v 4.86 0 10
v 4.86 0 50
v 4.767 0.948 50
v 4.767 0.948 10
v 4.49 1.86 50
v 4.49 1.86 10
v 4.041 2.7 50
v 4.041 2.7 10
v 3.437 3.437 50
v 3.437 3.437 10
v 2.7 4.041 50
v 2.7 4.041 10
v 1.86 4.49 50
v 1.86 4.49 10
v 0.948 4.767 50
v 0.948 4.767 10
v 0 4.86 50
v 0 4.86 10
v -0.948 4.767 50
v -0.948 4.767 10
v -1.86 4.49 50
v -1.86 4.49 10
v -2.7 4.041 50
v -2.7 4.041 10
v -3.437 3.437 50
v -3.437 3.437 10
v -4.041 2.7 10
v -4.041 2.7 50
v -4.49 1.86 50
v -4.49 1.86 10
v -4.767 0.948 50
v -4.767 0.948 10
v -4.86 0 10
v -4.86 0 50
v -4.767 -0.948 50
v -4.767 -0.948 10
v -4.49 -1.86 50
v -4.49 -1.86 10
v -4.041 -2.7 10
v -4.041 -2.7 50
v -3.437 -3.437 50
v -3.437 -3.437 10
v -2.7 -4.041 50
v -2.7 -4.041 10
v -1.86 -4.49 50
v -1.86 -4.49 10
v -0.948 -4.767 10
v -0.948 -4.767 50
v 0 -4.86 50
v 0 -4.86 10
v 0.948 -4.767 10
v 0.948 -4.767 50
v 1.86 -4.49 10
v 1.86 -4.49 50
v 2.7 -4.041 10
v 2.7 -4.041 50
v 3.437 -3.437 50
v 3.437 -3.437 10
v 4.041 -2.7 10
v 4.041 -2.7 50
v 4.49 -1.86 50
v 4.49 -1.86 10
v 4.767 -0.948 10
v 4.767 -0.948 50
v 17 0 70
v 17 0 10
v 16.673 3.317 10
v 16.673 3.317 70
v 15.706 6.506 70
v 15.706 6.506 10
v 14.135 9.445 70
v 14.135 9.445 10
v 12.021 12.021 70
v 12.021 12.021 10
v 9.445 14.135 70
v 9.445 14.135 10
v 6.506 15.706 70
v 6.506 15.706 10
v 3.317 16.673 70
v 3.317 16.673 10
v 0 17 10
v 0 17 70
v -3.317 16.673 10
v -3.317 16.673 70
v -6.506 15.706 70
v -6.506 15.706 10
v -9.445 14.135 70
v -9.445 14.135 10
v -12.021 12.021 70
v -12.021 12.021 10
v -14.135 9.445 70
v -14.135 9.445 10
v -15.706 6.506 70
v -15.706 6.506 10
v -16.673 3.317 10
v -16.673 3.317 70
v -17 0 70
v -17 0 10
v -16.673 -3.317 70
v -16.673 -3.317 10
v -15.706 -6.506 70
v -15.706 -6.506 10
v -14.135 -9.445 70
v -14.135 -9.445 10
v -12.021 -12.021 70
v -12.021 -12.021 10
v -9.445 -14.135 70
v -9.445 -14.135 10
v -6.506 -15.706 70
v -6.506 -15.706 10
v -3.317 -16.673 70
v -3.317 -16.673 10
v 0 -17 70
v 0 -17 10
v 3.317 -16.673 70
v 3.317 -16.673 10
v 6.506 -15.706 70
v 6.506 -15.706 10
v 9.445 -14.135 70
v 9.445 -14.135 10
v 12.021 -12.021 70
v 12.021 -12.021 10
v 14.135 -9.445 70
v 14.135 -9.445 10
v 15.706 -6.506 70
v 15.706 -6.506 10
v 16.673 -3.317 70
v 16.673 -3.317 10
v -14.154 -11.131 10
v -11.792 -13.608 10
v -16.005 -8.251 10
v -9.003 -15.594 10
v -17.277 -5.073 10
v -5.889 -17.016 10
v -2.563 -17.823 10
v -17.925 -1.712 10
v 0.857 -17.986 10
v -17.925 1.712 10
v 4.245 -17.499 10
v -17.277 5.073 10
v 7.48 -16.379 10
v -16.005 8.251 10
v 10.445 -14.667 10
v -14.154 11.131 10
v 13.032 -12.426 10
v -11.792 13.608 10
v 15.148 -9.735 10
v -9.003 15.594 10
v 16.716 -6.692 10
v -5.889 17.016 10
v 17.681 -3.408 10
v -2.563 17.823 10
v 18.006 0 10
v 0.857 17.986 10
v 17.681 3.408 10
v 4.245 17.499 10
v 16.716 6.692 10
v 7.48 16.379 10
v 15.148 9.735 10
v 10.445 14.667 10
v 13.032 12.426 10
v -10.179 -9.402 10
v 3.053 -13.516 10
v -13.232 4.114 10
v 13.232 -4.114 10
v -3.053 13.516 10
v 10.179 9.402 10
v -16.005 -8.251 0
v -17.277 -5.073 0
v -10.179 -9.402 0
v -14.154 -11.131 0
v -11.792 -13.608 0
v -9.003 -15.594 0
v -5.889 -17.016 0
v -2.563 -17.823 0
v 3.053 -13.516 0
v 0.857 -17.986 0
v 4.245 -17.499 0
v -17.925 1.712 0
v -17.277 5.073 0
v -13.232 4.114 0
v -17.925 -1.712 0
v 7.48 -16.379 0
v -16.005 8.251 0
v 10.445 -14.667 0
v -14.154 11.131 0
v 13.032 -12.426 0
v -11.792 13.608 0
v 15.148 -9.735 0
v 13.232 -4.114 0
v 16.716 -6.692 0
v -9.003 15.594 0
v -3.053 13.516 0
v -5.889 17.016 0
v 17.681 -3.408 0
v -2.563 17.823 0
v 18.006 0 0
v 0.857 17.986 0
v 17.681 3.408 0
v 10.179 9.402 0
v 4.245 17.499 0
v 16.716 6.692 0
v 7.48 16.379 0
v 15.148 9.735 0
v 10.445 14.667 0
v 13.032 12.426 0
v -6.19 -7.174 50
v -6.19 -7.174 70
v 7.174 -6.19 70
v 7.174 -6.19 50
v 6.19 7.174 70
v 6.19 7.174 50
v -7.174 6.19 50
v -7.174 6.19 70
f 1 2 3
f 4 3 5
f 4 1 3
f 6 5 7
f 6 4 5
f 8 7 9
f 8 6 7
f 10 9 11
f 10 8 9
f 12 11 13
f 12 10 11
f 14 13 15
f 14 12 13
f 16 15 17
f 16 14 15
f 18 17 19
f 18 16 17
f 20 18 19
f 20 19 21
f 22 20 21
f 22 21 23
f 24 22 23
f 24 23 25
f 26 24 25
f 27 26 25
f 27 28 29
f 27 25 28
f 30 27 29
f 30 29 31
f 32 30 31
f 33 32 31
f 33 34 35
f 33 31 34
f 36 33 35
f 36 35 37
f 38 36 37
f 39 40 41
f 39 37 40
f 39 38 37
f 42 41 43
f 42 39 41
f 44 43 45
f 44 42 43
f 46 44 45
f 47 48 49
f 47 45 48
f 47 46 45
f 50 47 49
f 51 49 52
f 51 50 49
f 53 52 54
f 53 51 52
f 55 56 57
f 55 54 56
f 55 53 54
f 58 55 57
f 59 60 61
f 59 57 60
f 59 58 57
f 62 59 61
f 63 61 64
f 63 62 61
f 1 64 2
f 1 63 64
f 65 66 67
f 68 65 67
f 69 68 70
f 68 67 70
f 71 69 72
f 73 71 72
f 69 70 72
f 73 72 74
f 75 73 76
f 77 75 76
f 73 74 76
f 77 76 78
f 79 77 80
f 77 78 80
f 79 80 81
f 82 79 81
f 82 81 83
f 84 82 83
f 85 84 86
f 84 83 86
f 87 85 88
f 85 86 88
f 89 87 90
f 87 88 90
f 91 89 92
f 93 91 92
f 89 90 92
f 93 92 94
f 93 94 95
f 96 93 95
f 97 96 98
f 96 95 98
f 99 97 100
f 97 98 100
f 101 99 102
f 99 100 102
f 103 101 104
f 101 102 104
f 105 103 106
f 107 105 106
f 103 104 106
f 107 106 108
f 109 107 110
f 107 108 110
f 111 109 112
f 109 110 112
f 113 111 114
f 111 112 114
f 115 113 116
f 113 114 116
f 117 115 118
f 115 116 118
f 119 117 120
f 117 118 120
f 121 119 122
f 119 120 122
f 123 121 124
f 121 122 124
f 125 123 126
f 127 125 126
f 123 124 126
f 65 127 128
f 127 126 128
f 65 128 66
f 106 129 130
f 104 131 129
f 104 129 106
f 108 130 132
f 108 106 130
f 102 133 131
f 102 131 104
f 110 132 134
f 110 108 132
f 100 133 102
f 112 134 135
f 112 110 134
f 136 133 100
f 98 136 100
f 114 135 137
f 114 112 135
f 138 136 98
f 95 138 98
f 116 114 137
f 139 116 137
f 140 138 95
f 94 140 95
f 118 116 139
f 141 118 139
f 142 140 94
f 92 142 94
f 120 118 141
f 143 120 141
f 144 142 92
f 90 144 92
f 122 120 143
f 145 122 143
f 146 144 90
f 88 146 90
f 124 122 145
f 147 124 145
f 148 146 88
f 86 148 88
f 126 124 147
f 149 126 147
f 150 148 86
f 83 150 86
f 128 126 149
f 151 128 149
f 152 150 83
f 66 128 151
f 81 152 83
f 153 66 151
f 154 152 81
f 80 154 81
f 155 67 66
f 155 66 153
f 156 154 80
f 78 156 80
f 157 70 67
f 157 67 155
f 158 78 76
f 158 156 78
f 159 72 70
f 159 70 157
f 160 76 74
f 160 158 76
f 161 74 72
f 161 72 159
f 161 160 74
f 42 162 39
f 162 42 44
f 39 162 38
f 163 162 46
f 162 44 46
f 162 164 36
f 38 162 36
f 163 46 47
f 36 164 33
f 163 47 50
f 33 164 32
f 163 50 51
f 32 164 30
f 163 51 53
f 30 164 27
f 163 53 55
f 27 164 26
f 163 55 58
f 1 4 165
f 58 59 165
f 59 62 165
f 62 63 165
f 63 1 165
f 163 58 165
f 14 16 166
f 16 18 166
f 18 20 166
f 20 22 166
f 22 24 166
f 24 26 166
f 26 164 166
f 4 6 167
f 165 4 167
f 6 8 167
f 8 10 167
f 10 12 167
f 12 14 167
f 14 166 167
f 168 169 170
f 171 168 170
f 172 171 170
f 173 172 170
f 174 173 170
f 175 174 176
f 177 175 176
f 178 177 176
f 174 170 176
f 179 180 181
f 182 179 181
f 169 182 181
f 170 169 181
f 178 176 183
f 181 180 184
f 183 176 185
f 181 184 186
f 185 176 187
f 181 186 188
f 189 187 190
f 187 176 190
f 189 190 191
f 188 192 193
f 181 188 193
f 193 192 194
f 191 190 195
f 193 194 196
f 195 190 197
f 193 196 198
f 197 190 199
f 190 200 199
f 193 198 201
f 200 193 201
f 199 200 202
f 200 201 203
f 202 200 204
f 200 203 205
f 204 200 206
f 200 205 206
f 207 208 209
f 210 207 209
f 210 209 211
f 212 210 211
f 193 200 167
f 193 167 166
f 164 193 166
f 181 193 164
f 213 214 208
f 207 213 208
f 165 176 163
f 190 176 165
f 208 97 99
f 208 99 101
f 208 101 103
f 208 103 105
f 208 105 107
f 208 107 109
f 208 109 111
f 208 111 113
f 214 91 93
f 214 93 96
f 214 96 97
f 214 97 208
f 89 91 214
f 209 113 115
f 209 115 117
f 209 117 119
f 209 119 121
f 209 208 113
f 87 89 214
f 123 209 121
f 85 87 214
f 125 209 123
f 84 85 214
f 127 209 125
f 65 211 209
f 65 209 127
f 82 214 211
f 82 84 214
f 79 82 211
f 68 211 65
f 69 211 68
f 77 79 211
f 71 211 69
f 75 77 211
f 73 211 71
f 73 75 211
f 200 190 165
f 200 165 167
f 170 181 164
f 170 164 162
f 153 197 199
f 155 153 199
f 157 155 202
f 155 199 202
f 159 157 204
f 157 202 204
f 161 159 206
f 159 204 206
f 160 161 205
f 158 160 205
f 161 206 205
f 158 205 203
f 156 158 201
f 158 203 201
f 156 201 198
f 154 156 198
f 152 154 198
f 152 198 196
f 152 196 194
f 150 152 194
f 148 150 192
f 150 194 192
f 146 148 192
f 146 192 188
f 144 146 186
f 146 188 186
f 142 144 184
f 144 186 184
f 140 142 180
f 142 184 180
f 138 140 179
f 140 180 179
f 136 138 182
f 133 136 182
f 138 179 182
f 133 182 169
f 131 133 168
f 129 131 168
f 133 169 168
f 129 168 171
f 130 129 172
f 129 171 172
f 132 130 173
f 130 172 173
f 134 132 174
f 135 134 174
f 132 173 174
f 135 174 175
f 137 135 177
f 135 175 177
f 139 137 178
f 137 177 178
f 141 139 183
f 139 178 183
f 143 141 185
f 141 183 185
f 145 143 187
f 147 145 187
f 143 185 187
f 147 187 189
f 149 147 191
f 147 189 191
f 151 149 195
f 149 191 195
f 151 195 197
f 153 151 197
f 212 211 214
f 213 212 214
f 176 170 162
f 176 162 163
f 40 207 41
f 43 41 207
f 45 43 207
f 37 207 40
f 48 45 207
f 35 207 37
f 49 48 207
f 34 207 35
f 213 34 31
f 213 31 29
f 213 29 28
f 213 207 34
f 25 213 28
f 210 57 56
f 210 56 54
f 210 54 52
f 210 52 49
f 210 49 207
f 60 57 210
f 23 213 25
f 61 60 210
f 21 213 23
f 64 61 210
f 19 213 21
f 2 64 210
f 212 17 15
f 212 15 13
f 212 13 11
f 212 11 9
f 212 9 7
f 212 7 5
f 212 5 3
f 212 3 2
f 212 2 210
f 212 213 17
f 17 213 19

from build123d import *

# Parameters (mm, degrees)
SKETCH_R      = 18.006159
PAD_DEPTH     = 10
SKETCH001_R   = 17
SKETCH001_R_2 = 4.86
PAD001_DEPTH  = 60
POCKET_DEPTH  = 20


with BuildPart() as part:
    # Sketch → Pad (new body)
    with BuildSketch(Plane.XY):
        Circle(SKETCH_R)
        Polygon((-13.231617, 4.113917), (-10.178565, -9.401958), (3.053052, -13.515875), (13.231617, -4.113917), (10.178565, 9.401958), (-3.053052, 13.515875), align=None, mode=Mode.SUBTRACT)
    extrude(amount=PAD_DEPTH)

    # Sketch001 (on Face9 of Pad) → Pad001 (join)
    with BuildSketch(Plane.XY.offset(10)):
        Circle(SKETCH001_R)
        Circle(SKETCH001_R_2, mode=Mode.SUBTRACT)
    extrude(amount=PAD001_DEPTH)

    # Sketch002 (on Face12 of Pad001) → Pocket (cut)
    with BuildSketch(Plane.XY.offset(70)):
        Polygon((-7.174122, 6.189667), (-6.189667, -7.174122), (7.174122, -6.189667), (6.189667, 7.174122), align=None)
    extrude(amount=-POCKET_DEPTH, mode=Mode.SUBTRACT)


solid = part.part
